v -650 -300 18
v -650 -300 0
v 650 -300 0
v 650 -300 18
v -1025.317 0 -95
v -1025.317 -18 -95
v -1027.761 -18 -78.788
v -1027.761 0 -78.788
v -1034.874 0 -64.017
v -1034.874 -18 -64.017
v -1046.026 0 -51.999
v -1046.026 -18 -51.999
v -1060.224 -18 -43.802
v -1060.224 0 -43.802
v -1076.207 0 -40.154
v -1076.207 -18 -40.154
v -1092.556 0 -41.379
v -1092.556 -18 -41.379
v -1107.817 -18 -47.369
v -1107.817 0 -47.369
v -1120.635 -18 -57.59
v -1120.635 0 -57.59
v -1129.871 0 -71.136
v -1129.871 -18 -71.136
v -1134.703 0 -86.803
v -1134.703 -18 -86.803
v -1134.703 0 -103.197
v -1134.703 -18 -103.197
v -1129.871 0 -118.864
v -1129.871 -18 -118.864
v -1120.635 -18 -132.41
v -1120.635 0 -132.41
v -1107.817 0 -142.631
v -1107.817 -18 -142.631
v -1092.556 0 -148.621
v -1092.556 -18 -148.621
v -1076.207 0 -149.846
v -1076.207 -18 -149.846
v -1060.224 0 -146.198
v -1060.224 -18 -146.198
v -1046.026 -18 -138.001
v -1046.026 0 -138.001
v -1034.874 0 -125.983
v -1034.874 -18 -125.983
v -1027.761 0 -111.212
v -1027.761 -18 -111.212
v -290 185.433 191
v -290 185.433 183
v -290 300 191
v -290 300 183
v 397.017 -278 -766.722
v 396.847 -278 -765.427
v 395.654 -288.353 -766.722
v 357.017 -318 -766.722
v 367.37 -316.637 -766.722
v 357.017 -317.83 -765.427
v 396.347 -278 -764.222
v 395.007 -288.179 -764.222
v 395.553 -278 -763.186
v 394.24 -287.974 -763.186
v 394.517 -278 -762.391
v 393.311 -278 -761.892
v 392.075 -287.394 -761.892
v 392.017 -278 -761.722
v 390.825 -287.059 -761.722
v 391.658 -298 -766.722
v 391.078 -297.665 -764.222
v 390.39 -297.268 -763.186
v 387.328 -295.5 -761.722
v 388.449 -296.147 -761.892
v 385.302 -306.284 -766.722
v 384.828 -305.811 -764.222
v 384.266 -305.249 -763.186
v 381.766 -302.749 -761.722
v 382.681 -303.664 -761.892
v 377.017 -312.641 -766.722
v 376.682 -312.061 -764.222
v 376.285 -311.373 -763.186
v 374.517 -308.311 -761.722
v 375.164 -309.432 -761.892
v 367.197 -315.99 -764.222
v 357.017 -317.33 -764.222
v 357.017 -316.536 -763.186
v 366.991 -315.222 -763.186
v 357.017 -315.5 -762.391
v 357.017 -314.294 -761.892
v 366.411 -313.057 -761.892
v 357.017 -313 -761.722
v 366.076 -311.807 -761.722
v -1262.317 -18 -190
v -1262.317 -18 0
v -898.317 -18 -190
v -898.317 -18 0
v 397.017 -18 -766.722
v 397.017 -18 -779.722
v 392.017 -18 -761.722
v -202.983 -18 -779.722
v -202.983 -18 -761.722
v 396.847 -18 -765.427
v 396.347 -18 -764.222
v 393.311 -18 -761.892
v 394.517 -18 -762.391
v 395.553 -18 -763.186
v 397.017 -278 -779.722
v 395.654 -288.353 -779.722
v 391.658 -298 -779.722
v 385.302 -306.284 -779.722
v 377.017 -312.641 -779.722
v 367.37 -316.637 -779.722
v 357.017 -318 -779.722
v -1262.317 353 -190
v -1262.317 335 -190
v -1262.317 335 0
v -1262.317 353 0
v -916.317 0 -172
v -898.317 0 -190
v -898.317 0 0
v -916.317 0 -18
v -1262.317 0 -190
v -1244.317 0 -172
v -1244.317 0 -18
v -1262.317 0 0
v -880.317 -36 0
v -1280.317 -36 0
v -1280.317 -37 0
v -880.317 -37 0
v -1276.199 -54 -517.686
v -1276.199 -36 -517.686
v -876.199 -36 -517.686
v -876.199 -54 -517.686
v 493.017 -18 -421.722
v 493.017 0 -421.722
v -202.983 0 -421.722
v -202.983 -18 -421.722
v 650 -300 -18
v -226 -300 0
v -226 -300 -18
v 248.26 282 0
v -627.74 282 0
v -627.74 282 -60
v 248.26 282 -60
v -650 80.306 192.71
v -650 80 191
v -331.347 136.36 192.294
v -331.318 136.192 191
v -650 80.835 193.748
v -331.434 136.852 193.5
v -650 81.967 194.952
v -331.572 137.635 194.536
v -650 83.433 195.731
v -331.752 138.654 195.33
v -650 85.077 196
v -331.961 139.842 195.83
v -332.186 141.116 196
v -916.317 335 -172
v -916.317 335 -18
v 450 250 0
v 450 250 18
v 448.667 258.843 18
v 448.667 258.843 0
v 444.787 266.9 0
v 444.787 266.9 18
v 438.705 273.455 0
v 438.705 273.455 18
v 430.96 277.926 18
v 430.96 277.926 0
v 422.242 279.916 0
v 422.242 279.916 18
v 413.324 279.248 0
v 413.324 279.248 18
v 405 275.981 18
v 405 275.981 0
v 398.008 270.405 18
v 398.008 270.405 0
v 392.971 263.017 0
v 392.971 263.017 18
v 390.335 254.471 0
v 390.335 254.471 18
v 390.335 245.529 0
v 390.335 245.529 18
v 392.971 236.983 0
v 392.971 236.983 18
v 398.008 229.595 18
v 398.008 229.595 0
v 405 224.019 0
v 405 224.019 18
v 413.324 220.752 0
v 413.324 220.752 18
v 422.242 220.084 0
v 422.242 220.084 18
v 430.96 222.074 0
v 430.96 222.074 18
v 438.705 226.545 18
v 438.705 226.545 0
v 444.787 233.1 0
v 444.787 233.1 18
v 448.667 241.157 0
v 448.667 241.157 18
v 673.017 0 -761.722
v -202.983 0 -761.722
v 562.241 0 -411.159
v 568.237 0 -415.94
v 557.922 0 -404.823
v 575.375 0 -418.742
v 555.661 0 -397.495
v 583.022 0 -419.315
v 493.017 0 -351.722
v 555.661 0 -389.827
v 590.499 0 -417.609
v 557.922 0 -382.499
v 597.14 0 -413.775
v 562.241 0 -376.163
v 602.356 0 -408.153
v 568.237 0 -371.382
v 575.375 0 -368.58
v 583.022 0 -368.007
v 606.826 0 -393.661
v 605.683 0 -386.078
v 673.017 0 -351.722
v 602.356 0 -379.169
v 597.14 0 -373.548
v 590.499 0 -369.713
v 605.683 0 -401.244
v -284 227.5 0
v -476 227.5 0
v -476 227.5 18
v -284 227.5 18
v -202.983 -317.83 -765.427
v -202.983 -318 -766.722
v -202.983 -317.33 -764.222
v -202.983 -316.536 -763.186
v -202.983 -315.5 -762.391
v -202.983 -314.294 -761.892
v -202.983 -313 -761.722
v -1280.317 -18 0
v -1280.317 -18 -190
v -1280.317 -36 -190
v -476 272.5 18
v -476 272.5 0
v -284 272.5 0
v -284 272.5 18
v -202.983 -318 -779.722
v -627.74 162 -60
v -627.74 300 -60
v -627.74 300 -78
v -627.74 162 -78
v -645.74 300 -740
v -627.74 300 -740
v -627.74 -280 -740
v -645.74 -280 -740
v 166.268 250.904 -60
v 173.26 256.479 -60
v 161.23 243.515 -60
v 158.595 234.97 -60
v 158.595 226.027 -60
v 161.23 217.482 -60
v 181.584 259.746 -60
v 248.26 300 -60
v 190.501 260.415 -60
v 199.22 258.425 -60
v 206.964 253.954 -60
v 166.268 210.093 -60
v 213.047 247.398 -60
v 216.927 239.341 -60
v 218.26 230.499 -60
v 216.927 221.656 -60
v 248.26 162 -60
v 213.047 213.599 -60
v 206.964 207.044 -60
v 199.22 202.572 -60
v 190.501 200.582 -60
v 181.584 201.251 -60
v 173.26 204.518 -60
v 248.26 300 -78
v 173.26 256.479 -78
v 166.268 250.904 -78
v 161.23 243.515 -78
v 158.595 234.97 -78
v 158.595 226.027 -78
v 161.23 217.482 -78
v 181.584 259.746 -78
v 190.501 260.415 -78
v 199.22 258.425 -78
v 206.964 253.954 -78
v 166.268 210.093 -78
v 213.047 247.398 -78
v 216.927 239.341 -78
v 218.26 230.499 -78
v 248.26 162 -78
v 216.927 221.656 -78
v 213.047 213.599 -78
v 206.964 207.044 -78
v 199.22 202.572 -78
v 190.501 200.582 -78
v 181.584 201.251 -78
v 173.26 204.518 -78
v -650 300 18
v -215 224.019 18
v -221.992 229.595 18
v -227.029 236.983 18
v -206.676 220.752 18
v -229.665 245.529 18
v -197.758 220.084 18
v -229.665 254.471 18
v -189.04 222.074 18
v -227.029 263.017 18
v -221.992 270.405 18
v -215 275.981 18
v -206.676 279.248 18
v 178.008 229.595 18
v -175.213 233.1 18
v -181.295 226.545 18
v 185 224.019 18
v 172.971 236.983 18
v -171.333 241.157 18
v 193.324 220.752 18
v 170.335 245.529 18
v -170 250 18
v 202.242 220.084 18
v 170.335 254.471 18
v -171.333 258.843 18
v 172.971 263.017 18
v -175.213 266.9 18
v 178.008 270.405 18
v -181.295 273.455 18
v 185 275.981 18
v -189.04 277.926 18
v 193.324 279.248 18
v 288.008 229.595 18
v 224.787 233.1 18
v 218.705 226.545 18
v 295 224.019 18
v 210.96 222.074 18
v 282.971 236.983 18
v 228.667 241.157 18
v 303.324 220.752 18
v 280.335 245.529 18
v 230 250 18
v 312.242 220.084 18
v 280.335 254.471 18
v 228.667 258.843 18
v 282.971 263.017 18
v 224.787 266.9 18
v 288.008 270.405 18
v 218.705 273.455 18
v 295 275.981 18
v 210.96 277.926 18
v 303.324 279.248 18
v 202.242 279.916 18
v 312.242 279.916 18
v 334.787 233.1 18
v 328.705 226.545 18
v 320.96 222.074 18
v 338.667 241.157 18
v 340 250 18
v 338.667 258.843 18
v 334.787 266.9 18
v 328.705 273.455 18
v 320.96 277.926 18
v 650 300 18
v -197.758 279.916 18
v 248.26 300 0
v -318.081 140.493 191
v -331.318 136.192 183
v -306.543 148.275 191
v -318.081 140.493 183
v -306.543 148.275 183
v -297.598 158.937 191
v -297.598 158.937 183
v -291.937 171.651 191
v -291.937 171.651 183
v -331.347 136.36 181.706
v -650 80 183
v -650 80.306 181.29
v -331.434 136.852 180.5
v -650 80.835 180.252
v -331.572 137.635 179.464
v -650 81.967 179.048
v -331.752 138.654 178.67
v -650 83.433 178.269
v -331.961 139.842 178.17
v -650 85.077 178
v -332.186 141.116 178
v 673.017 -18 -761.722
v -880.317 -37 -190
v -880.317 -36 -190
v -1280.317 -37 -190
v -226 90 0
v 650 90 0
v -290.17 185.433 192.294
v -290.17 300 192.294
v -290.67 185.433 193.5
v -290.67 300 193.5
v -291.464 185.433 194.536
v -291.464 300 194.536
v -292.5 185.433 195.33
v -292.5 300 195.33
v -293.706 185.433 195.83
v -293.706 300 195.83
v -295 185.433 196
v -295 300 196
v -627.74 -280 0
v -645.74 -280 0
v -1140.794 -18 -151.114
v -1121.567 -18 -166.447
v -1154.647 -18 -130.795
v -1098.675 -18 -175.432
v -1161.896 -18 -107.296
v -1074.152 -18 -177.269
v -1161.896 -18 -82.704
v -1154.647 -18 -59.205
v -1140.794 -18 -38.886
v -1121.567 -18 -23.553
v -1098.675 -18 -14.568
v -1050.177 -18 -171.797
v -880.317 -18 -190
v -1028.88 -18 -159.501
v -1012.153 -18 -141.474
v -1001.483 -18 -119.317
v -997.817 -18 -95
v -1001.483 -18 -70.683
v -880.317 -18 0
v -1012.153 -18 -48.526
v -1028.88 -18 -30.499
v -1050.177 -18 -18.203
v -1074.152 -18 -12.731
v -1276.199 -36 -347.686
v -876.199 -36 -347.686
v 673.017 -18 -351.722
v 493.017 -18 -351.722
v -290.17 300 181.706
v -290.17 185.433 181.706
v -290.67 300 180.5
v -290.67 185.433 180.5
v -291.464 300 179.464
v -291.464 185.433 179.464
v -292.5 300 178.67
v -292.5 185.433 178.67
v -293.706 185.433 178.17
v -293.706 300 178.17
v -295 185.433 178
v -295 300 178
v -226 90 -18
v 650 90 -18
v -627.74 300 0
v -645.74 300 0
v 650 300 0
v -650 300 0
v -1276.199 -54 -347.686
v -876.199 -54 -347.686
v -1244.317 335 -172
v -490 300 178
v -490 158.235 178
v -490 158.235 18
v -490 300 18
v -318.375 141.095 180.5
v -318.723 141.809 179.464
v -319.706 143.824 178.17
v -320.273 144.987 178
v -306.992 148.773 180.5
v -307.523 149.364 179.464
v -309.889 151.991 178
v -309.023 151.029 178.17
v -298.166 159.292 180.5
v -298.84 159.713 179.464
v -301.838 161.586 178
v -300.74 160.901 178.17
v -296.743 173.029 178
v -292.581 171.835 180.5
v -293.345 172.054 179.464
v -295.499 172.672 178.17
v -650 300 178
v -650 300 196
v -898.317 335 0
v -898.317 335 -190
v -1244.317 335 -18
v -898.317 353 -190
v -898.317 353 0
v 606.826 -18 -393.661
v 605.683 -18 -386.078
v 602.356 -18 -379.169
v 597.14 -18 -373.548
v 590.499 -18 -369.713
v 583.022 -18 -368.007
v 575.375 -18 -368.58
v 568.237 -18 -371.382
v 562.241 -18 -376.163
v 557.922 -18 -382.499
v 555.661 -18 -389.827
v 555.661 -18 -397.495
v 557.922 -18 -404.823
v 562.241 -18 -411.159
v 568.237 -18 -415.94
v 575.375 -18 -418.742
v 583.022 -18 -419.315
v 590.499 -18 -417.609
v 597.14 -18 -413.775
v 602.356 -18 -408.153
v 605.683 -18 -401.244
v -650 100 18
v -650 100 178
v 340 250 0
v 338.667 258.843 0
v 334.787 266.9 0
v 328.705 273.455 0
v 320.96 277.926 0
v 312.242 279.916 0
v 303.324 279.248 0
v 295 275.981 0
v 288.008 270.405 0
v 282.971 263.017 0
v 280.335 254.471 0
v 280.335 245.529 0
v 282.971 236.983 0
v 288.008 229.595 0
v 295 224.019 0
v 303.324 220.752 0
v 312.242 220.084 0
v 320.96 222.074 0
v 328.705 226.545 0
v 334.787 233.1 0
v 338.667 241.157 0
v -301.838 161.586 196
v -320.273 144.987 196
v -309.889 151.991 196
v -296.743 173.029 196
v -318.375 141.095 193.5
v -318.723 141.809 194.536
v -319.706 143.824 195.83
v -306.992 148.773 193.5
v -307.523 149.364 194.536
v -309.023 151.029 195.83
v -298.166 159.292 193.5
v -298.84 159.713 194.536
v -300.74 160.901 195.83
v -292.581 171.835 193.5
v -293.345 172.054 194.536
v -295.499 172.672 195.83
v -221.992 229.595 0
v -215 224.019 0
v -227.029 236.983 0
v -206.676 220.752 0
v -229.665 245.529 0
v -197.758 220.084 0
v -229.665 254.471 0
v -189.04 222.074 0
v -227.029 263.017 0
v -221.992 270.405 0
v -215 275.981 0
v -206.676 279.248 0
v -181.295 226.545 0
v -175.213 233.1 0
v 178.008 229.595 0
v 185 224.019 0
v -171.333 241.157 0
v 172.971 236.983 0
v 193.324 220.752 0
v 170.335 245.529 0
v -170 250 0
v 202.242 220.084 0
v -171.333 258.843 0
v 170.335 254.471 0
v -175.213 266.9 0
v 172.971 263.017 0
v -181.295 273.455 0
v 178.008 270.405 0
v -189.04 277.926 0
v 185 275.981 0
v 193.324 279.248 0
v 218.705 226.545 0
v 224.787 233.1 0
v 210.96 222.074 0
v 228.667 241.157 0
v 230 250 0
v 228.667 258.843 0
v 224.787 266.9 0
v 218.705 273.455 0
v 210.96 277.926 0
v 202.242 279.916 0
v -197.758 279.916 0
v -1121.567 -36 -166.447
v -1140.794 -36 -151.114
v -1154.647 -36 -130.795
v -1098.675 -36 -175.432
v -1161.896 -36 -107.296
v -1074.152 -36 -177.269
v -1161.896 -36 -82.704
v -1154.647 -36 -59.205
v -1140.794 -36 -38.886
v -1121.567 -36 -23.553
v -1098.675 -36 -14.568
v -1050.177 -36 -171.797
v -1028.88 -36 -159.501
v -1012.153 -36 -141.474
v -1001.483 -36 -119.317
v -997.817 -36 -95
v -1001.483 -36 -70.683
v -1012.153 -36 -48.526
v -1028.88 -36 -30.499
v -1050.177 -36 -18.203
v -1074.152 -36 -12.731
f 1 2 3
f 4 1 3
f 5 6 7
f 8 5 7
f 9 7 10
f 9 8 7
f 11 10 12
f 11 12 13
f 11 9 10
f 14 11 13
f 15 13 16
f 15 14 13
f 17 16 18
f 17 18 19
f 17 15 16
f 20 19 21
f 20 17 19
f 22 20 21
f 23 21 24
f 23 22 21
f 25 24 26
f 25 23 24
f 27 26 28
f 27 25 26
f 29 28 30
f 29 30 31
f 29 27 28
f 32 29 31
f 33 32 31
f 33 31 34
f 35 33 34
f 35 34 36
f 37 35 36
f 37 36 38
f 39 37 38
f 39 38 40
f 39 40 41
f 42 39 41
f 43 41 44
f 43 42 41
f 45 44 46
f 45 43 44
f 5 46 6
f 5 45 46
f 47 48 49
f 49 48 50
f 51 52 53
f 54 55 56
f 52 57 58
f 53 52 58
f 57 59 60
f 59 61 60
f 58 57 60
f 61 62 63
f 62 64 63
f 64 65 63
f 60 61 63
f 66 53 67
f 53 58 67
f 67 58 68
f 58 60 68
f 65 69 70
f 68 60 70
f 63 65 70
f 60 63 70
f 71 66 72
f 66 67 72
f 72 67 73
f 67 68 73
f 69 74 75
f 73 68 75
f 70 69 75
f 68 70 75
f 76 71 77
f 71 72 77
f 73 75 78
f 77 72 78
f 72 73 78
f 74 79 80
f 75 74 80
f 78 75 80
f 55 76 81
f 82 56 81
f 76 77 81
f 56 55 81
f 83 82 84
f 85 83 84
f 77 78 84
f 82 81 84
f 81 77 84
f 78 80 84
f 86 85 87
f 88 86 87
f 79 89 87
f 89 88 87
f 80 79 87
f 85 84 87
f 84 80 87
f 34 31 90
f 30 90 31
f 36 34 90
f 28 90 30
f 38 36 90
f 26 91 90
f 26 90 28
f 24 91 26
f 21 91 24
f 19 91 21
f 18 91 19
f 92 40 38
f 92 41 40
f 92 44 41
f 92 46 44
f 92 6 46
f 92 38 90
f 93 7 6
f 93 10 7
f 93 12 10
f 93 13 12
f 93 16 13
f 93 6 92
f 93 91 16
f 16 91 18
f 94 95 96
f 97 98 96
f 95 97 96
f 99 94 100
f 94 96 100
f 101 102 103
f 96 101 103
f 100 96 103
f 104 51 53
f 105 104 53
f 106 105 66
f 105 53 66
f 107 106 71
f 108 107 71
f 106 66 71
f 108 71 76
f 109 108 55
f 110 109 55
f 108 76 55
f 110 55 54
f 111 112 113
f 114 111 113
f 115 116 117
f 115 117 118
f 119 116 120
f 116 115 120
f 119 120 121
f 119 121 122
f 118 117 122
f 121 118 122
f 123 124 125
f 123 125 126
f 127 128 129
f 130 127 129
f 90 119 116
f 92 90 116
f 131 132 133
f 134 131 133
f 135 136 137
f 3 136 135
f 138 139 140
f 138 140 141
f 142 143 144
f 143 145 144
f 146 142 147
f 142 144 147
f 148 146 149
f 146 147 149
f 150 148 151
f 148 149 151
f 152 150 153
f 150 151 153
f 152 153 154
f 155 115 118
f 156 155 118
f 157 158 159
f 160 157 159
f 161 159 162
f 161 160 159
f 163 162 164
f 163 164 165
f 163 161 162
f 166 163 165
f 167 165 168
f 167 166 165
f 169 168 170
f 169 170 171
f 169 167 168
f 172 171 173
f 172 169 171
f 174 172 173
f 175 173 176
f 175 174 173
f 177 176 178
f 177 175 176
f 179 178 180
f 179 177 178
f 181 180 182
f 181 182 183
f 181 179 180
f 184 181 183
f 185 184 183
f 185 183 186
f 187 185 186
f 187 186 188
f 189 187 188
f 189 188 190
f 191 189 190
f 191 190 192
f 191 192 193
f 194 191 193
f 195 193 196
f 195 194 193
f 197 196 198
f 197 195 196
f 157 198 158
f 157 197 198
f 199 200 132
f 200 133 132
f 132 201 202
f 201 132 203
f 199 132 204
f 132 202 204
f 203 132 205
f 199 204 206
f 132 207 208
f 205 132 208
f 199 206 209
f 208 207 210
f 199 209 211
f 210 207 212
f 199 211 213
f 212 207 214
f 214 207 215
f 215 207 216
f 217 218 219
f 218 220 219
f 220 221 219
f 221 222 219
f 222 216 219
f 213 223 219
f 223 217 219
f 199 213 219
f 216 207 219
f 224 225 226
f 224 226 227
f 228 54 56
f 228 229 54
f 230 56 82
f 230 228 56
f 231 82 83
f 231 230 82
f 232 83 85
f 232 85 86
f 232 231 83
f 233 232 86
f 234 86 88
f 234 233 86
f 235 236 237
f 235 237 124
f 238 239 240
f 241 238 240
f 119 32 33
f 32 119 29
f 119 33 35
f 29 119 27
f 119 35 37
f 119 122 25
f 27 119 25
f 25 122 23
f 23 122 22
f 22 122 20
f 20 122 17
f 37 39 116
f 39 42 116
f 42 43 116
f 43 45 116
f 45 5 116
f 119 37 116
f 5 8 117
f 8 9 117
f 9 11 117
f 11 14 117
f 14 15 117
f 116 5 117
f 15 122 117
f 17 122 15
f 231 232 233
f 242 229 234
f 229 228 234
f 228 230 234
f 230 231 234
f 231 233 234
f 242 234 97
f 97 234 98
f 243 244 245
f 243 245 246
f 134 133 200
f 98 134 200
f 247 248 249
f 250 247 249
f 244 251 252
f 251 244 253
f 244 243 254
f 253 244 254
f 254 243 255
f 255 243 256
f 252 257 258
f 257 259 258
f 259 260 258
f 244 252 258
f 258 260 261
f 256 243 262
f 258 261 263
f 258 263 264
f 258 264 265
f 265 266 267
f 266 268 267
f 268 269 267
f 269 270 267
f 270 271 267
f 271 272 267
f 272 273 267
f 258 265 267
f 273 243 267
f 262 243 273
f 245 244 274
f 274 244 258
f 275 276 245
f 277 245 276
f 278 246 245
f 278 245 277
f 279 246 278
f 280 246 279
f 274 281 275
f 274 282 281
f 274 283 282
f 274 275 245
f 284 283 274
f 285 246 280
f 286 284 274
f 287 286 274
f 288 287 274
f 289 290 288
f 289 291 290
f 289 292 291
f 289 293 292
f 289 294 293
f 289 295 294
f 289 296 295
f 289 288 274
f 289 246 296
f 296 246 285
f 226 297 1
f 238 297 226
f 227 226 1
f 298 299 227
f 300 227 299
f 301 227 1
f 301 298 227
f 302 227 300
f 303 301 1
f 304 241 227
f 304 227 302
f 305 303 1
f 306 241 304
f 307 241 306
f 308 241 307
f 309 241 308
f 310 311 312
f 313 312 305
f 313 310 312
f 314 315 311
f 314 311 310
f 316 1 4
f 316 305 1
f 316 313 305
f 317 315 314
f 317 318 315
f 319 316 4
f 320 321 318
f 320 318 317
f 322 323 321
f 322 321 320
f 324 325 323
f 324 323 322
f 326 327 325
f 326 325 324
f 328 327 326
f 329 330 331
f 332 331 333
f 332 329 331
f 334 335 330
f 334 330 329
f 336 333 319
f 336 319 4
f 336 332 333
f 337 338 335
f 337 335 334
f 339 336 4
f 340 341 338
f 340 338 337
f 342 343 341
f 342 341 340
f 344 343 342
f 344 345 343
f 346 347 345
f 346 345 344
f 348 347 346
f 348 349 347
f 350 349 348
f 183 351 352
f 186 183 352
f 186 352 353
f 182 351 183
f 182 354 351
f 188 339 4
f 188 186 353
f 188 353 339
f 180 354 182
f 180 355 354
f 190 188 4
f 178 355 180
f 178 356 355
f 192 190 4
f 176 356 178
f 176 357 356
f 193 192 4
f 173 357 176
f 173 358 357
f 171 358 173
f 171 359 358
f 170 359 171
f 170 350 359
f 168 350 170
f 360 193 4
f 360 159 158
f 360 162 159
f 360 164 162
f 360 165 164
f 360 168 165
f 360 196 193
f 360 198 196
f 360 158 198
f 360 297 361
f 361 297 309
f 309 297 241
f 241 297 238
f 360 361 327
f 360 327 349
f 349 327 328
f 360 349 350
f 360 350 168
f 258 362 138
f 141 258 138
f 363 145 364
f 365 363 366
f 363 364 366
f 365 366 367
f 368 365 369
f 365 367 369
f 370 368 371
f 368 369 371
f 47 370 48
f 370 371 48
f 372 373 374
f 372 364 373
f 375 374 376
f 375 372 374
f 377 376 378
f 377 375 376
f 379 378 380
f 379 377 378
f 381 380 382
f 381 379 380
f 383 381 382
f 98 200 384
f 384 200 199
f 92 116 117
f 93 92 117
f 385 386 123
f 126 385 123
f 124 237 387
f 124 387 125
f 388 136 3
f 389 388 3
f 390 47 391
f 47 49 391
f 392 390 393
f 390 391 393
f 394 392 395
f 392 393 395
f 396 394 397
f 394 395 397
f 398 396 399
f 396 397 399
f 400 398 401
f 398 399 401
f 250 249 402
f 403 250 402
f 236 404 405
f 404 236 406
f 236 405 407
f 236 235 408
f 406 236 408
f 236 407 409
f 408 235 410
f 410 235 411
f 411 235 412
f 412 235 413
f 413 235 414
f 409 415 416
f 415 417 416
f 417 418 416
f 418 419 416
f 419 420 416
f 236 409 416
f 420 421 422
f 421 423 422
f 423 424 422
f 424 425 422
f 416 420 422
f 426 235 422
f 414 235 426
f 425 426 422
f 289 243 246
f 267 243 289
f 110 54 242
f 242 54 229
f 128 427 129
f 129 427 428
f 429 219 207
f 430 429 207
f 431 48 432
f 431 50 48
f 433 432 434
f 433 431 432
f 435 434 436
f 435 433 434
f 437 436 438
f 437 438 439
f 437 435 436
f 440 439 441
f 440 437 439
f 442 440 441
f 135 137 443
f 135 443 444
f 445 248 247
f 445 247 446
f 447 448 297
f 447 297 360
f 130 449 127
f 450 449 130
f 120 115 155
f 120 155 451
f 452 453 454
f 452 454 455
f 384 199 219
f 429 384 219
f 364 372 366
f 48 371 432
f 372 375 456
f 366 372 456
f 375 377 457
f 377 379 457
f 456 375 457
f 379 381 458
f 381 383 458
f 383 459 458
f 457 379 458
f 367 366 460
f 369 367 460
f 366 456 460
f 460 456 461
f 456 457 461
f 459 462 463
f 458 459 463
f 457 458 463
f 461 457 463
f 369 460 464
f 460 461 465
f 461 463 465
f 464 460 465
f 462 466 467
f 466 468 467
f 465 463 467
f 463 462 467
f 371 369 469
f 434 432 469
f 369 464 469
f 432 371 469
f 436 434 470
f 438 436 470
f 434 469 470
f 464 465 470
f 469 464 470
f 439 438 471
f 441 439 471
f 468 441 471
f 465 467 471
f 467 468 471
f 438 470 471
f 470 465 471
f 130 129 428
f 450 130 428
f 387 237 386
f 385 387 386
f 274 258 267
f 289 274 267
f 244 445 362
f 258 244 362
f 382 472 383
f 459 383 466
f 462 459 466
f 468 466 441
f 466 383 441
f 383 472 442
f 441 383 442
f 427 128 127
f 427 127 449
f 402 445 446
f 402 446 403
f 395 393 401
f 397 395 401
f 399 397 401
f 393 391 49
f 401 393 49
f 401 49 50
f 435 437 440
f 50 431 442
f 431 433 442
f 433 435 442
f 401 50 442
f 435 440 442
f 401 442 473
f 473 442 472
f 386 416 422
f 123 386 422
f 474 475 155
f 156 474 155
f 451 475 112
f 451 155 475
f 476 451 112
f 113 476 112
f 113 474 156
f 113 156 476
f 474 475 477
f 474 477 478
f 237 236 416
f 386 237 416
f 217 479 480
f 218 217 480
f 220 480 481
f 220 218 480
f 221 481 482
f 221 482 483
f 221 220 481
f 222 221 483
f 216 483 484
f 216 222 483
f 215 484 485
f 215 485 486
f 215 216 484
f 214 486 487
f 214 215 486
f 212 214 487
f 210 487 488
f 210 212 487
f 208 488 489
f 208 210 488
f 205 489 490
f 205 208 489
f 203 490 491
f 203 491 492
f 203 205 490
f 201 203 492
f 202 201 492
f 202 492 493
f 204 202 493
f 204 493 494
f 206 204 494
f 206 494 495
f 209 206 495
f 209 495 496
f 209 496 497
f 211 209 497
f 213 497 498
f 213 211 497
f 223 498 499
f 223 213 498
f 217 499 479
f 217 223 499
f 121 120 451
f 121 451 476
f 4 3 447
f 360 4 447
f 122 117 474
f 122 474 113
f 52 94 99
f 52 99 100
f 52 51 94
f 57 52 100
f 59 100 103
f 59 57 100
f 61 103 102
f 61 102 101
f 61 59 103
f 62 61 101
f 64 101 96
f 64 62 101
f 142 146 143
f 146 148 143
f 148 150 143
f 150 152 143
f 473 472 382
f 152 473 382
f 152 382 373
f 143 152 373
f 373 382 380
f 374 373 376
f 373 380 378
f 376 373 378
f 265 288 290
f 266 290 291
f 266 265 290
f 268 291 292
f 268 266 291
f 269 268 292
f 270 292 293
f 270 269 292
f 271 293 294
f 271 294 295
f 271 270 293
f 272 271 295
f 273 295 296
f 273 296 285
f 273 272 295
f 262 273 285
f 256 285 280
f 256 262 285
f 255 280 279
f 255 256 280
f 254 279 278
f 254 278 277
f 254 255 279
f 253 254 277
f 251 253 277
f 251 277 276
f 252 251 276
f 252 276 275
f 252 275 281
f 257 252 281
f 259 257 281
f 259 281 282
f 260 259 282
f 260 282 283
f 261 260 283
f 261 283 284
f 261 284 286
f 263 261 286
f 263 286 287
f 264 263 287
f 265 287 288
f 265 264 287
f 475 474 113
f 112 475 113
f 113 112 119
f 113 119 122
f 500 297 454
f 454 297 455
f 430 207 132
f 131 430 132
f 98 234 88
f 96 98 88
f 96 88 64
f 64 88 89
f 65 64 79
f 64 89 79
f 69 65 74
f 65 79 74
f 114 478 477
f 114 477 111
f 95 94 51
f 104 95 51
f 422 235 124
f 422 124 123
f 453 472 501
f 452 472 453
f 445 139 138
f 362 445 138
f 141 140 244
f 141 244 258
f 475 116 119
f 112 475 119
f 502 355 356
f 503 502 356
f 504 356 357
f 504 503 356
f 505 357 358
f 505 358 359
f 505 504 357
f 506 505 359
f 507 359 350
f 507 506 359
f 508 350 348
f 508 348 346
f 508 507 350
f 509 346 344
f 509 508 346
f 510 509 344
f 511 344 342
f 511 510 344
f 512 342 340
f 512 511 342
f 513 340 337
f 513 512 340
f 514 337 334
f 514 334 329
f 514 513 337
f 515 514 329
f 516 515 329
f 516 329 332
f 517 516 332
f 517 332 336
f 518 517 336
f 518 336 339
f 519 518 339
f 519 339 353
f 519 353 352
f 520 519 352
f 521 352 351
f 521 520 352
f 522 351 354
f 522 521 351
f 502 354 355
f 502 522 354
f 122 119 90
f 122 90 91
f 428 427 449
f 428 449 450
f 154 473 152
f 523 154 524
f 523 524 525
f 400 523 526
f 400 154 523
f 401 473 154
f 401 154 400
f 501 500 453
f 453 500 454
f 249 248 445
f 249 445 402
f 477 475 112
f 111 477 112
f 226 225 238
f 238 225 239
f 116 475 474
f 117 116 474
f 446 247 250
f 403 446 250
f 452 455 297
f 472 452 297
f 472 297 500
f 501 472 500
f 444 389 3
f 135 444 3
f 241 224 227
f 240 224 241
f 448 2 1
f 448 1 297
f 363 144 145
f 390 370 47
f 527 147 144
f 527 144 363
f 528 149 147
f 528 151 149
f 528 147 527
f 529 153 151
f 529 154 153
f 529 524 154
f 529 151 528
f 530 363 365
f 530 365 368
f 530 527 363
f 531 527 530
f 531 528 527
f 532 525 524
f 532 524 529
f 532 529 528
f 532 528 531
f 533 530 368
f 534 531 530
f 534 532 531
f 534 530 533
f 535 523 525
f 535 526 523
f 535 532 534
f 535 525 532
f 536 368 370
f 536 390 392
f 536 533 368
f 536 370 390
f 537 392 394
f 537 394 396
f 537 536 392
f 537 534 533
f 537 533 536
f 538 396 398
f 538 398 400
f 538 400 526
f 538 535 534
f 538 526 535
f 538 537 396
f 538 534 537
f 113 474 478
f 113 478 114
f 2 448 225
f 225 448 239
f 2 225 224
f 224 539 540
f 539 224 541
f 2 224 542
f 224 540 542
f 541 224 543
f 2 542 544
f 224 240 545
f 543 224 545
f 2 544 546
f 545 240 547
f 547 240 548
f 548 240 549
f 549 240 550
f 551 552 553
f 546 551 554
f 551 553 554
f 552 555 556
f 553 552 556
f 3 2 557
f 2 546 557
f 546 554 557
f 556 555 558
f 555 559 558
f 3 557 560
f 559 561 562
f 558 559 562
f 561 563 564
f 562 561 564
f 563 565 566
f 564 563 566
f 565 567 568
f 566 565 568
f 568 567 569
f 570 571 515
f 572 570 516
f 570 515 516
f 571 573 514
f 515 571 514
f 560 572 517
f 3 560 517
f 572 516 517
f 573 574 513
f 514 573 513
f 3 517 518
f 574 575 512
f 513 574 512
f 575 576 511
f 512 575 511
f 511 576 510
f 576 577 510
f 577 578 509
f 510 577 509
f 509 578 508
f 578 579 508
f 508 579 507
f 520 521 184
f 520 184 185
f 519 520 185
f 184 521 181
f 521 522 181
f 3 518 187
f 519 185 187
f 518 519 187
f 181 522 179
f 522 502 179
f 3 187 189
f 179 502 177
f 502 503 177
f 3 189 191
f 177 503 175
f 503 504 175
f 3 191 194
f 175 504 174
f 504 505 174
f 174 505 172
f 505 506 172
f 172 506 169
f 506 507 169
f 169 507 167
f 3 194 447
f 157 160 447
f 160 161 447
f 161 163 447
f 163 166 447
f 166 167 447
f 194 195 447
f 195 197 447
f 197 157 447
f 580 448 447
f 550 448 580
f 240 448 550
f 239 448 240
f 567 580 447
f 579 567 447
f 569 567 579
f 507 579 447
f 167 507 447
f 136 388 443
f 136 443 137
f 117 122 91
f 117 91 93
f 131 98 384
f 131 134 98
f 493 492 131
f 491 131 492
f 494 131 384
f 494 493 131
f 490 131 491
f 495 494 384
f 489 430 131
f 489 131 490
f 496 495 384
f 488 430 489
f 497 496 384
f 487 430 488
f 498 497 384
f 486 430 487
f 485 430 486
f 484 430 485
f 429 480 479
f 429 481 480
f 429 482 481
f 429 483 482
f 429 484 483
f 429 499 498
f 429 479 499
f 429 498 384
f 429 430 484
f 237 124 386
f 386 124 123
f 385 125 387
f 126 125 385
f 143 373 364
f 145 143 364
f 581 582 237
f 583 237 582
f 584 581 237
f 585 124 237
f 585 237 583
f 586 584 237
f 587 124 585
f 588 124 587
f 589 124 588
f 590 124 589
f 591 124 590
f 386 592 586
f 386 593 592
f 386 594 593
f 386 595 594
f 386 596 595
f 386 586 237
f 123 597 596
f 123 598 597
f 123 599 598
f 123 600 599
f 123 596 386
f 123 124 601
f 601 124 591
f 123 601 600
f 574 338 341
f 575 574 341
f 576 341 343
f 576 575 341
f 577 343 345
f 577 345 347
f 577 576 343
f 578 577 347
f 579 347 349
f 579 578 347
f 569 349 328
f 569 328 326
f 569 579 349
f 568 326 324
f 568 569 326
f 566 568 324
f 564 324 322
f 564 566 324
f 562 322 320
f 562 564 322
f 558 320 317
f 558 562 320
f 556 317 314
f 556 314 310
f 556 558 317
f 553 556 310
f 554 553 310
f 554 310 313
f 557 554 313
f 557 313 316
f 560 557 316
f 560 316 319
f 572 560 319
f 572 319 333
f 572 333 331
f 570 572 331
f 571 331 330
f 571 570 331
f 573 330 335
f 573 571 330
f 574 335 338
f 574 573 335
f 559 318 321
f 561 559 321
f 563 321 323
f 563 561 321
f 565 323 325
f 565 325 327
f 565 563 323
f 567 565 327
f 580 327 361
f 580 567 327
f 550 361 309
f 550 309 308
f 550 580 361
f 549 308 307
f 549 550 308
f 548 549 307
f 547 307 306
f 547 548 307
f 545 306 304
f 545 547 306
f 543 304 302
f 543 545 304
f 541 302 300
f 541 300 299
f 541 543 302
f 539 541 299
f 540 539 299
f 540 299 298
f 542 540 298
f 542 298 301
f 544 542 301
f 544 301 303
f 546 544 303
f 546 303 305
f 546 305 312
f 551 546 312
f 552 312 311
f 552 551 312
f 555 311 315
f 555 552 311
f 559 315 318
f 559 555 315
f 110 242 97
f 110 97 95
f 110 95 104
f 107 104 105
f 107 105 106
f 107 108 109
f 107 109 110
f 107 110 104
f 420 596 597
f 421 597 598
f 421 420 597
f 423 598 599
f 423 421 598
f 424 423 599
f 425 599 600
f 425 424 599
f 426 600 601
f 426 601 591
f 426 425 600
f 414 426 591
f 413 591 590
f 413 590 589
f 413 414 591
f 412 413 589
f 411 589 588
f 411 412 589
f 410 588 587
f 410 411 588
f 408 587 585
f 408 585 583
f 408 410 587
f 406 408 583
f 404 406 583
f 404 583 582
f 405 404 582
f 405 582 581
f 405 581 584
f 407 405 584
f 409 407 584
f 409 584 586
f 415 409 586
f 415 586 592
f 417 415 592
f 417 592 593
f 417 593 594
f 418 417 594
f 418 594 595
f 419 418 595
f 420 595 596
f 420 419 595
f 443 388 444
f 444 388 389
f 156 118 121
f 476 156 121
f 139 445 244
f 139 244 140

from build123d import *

# Parameters (mm, degrees)
F0_W      = 1300
F0_H      = 600
F0_W_2    = 192
F0_H_2    = 45
F0_R      = 30
F1_DEPTH  = 18
F2_W      = 876
F2_H      = 18
F3_DEPTH  = 60
F4_W      = 876
F4_H      = 138
F4_R      = 30
F5_DEPTH  = 18
F6_W      = 580
F6_H      = 740
F7_DEPTH  = 18
F9_DEPTH  = 160
F11_DEPTH = 18
F12_R     = 5
F13_W     = 364
F13_H     = 190
F13_R     = 55
F14_DEPTH = 18
F15_W     = 364
F15_H     = 190
F15_W_2   = 328
F15_H_2   = 154
F16_DEPTH = 335
F17_W     = 400
F17_H     = 190
F17_R     = 82.5
F18_DEPTH = 18
F19_W     = 364
F19_H     = 190
F20_DEPTH = 18
F21_W     = 876
F21_H     = 390
F22_DEPTH = 18
F23_R     = 25.726034
F24_DEPTH = 18
F26_DEPTH = 18
F27_R     = 5
F28_W     = 400
F28_H     = 170
F29_DEPTH = 18
F30_W     = 400
F30_H     = 190
F31_DEPTH = 1


with BuildPart() as f1:
    # F0 (on Top) → F1 (new body)
    with BuildSketch(Plane.XY):
        Rectangle(F0_W, F0_H)
        with Locations((-380, 250)):
            Rectangle(F0_W_2, F0_H_2, mode=Mode.SUBTRACT)
        with Locations((-200, 250)):
            Circle(F0_R, mode=Mode.SUBTRACT)
        with Locations((200, 250)):
            Circle(F0_R, mode=Mode.SUBTRACT)
        with Locations((310, 250)):
            Circle(F0_R, mode=Mode.SUBTRACT)
        with Locations((420, 250)):
            Circle(F0_R, mode=Mode.SUBTRACT)
    extrude(amount=F1_DEPTH)


with BuildPart() as f3:
    # F2 (on face) → F3 (new body)
    with BuildSketch(Plane(origin=(0, 0, 0), x_dir=(1, 0, 0), z_dir=(0, 0, -1))):
        with Locations((-189.740443, -291)):
            Rectangle(F2_W, F2_H)
    extrude(amount=F3_DEPTH)


with BuildPart() as f5:
    # F4 (on face) → F5 (new body)
    with BuildSketch(Plane(origin=(0, 0, -60), x_dir=(1, 0, 0), z_dir=(0, 0, -1))):
        with Locations((-189.740443, -231)):
            Rectangle(F4_W, F4_H)
        with Locations((188.259557, -230.498597)):
            Circle(F4_R, mode=Mode.SUBTRACT)
    extrude(amount=F5_DEPTH)


with BuildPart() as f7:
    # F6 (on face) → F7 (new body)
    with BuildSketch(Plane(origin=(-627.740443, 0, 0), x_dir=(0, -1, 0), z_dir=(-1, 0, 0))):
        with Locations((-10, -370)):
            Rectangle(F6_W, F6_H)
    extrude(amount=F7_DEPTH)


with BuildPart() as f9:
    # F8 (on face) → F9 (new body)
    with BuildSketch(Plane.XY.offset(18)):
        Polygon((-490, 300), (-650, 300), (-650, 100), (-490, 158.235237), align=None)
    extrude(amount=F9_DEPTH)


with BuildPart() as f11:
    # F10 (on face) → F11 (new body)
    with BuildSketch(Plane.XY.offset(178)):
        with BuildLine():
            Line((-650, 300), (-650, 80))
            Line((-650, 80), (-331.317591, 136.192307))
            ThreePointArc((-331.317591, 136.192307), (-301.697778, 153.293314), (-290, 185.432695))
            Line((-290, 185.432695), (-290, 300))
            Line((-290, 300), (-650, 300))
        make_face()
    extrude(amount=F11_DEPTH)

    # F12
    f12_edges = [f11.edges().sort_by_distance(p)[0] for p in [
        (-490.658796, 108.096153, 196),
        (-301.697778, 153.293314, 196),
        (-290, 242.716347, 196),
        (-490.658796, 108.096153, 178),
        (-301.697778, 153.293314, 178),
        (-290, 242.716347, 178),
    ]]
    fillet(f12_edges, radius=F12_R)


with BuildPart() as f14:
    # F13 (on Front) → F14 (new body)
    with BuildSketch(Plane.XZ):
        with Locations((-1080.317497, -95)):
            Rectangle(F13_W, F13_H)
        with Locations((-1080.317497, -95)):
            Circle(F13_R, mode=Mode.SUBTRACT)
    extrude(amount=F14_DEPTH)


with BuildPart() as f16:
    # F15 (on face) → F16 (new body)
    with BuildSketch(Plane(origin=(0, 0, 0), x_dir=(-1, 0, 0), z_dir=(0, 1, 0))):
        with Locations((1080.317497, -95)):
            Rectangle(F15_W, F15_H)
        with Locations((1080.317497, -95)):
            Rectangle(F15_W_2, F15_H_2, mode=Mode.SUBTRACT)
    extrude(amount=F16_DEPTH)


with BuildPart() as f18:
    # F17 (on face) → F18 (new body)
    with BuildSketch(Plane.XZ.offset(18)):
        with Locations((-1080.317497, -95)):
            Rectangle(F17_W, F17_H)
        with Locations((-1080.317497, -95)):
            Circle(F17_R, mode=Mode.SUBTRACT)
    extrude(amount=F18_DEPTH)


with BuildPart() as f20:
    # F19 (on face) → F20 (new body)
    with BuildSketch(Plane(origin=(0, 335, 0), x_dir=(-1, 0, 0), z_dir=(0, 1, 0))):
        with Locations((1080.317497, -95)):
            Rectangle(F19_W, F19_H)
    extrude(amount=F20_DEPTH)


with BuildPart() as f22:
    # F21 (on face) → F22 (new body)
    with BuildSketch(Plane(origin=(0, 0, 0), x_dir=(1, 0, 0), z_dir=(0, 0, -1))):
        with Locations((212, 105)):
            Rectangle(F21_W, F21_H)
    extrude(amount=F22_DEPTH)


with BuildPart() as f24:
    # F23 (on Front) → F24 (new body)
    with BuildSketch(Plane.XZ):
        Polygon((-202.982641, -761.721503), (673.017359, -761.721503), (673.017359, -351.721503), (493.017359, -351.721503), (493.017359, -421.721503), (-202.982641, -421.721503), align=None)
        with Locations((581.099927, -393.661082)):
            Circle(F23_R, mode=Mode.SUBTRACT)
    extrude(amount=F24_DEPTH)


with BuildPart() as f26:
    # F25 (on face) → F26 (new body)
    with BuildSketch(Plane(origin=(0, 0, -761.721503), x_dir=(1, 0, 0), z_dir=(0, 0, -1))):
        with BuildLine():
            Line((-202.982641, 318), (-202.982641, 18))
            Line((-202.982641, 18), (397.017359, 18))
            Line((397.017359, 18), (397.017359, 278))
            ThreePointArc((397.017359, 278), (385.301631, 306.284271), (357.017359, 318))
            Line((357.017359, 318), (-202.982641, 318))
        make_face()
    extrude(amount=F26_DEPTH)

    # F27
    f27_edges = [f26.edges().sort_by_distance(p)[0] for p in [
        (77.017359, -318, -761.721503),
        (385.301631, -306.284271, -761.721503),
        (397.017359, -148, -761.721503),
    ]]
    fillet(f27_edges, radius=F27_R)


with BuildPart() as f29:
    # F28 (on face) → F29 (new body)
    with BuildSketch(Plane.XZ.offset(36)):
        with Locations((-1076.199204, -432.686272)):
            Rectangle(F28_W, F28_H)
    extrude(amount=F29_DEPTH)


with BuildPart() as f31:
    # F30 (on face) → F31 (new body)
    with BuildSketch(Plane.XZ.offset(36)):
        with Locations((-1080.317497, -95)):
            Rectangle(F30_W, F30_H)
    extrude(amount=F31_DEPTH)


solid = Compound([f1.part, f3.part, f5.part, f7.part, f9.part, f11.part, f14.part, f16.part, f18.part, f20.part, f22.part, f24.part, f26.part, f29.part, f31.part])
